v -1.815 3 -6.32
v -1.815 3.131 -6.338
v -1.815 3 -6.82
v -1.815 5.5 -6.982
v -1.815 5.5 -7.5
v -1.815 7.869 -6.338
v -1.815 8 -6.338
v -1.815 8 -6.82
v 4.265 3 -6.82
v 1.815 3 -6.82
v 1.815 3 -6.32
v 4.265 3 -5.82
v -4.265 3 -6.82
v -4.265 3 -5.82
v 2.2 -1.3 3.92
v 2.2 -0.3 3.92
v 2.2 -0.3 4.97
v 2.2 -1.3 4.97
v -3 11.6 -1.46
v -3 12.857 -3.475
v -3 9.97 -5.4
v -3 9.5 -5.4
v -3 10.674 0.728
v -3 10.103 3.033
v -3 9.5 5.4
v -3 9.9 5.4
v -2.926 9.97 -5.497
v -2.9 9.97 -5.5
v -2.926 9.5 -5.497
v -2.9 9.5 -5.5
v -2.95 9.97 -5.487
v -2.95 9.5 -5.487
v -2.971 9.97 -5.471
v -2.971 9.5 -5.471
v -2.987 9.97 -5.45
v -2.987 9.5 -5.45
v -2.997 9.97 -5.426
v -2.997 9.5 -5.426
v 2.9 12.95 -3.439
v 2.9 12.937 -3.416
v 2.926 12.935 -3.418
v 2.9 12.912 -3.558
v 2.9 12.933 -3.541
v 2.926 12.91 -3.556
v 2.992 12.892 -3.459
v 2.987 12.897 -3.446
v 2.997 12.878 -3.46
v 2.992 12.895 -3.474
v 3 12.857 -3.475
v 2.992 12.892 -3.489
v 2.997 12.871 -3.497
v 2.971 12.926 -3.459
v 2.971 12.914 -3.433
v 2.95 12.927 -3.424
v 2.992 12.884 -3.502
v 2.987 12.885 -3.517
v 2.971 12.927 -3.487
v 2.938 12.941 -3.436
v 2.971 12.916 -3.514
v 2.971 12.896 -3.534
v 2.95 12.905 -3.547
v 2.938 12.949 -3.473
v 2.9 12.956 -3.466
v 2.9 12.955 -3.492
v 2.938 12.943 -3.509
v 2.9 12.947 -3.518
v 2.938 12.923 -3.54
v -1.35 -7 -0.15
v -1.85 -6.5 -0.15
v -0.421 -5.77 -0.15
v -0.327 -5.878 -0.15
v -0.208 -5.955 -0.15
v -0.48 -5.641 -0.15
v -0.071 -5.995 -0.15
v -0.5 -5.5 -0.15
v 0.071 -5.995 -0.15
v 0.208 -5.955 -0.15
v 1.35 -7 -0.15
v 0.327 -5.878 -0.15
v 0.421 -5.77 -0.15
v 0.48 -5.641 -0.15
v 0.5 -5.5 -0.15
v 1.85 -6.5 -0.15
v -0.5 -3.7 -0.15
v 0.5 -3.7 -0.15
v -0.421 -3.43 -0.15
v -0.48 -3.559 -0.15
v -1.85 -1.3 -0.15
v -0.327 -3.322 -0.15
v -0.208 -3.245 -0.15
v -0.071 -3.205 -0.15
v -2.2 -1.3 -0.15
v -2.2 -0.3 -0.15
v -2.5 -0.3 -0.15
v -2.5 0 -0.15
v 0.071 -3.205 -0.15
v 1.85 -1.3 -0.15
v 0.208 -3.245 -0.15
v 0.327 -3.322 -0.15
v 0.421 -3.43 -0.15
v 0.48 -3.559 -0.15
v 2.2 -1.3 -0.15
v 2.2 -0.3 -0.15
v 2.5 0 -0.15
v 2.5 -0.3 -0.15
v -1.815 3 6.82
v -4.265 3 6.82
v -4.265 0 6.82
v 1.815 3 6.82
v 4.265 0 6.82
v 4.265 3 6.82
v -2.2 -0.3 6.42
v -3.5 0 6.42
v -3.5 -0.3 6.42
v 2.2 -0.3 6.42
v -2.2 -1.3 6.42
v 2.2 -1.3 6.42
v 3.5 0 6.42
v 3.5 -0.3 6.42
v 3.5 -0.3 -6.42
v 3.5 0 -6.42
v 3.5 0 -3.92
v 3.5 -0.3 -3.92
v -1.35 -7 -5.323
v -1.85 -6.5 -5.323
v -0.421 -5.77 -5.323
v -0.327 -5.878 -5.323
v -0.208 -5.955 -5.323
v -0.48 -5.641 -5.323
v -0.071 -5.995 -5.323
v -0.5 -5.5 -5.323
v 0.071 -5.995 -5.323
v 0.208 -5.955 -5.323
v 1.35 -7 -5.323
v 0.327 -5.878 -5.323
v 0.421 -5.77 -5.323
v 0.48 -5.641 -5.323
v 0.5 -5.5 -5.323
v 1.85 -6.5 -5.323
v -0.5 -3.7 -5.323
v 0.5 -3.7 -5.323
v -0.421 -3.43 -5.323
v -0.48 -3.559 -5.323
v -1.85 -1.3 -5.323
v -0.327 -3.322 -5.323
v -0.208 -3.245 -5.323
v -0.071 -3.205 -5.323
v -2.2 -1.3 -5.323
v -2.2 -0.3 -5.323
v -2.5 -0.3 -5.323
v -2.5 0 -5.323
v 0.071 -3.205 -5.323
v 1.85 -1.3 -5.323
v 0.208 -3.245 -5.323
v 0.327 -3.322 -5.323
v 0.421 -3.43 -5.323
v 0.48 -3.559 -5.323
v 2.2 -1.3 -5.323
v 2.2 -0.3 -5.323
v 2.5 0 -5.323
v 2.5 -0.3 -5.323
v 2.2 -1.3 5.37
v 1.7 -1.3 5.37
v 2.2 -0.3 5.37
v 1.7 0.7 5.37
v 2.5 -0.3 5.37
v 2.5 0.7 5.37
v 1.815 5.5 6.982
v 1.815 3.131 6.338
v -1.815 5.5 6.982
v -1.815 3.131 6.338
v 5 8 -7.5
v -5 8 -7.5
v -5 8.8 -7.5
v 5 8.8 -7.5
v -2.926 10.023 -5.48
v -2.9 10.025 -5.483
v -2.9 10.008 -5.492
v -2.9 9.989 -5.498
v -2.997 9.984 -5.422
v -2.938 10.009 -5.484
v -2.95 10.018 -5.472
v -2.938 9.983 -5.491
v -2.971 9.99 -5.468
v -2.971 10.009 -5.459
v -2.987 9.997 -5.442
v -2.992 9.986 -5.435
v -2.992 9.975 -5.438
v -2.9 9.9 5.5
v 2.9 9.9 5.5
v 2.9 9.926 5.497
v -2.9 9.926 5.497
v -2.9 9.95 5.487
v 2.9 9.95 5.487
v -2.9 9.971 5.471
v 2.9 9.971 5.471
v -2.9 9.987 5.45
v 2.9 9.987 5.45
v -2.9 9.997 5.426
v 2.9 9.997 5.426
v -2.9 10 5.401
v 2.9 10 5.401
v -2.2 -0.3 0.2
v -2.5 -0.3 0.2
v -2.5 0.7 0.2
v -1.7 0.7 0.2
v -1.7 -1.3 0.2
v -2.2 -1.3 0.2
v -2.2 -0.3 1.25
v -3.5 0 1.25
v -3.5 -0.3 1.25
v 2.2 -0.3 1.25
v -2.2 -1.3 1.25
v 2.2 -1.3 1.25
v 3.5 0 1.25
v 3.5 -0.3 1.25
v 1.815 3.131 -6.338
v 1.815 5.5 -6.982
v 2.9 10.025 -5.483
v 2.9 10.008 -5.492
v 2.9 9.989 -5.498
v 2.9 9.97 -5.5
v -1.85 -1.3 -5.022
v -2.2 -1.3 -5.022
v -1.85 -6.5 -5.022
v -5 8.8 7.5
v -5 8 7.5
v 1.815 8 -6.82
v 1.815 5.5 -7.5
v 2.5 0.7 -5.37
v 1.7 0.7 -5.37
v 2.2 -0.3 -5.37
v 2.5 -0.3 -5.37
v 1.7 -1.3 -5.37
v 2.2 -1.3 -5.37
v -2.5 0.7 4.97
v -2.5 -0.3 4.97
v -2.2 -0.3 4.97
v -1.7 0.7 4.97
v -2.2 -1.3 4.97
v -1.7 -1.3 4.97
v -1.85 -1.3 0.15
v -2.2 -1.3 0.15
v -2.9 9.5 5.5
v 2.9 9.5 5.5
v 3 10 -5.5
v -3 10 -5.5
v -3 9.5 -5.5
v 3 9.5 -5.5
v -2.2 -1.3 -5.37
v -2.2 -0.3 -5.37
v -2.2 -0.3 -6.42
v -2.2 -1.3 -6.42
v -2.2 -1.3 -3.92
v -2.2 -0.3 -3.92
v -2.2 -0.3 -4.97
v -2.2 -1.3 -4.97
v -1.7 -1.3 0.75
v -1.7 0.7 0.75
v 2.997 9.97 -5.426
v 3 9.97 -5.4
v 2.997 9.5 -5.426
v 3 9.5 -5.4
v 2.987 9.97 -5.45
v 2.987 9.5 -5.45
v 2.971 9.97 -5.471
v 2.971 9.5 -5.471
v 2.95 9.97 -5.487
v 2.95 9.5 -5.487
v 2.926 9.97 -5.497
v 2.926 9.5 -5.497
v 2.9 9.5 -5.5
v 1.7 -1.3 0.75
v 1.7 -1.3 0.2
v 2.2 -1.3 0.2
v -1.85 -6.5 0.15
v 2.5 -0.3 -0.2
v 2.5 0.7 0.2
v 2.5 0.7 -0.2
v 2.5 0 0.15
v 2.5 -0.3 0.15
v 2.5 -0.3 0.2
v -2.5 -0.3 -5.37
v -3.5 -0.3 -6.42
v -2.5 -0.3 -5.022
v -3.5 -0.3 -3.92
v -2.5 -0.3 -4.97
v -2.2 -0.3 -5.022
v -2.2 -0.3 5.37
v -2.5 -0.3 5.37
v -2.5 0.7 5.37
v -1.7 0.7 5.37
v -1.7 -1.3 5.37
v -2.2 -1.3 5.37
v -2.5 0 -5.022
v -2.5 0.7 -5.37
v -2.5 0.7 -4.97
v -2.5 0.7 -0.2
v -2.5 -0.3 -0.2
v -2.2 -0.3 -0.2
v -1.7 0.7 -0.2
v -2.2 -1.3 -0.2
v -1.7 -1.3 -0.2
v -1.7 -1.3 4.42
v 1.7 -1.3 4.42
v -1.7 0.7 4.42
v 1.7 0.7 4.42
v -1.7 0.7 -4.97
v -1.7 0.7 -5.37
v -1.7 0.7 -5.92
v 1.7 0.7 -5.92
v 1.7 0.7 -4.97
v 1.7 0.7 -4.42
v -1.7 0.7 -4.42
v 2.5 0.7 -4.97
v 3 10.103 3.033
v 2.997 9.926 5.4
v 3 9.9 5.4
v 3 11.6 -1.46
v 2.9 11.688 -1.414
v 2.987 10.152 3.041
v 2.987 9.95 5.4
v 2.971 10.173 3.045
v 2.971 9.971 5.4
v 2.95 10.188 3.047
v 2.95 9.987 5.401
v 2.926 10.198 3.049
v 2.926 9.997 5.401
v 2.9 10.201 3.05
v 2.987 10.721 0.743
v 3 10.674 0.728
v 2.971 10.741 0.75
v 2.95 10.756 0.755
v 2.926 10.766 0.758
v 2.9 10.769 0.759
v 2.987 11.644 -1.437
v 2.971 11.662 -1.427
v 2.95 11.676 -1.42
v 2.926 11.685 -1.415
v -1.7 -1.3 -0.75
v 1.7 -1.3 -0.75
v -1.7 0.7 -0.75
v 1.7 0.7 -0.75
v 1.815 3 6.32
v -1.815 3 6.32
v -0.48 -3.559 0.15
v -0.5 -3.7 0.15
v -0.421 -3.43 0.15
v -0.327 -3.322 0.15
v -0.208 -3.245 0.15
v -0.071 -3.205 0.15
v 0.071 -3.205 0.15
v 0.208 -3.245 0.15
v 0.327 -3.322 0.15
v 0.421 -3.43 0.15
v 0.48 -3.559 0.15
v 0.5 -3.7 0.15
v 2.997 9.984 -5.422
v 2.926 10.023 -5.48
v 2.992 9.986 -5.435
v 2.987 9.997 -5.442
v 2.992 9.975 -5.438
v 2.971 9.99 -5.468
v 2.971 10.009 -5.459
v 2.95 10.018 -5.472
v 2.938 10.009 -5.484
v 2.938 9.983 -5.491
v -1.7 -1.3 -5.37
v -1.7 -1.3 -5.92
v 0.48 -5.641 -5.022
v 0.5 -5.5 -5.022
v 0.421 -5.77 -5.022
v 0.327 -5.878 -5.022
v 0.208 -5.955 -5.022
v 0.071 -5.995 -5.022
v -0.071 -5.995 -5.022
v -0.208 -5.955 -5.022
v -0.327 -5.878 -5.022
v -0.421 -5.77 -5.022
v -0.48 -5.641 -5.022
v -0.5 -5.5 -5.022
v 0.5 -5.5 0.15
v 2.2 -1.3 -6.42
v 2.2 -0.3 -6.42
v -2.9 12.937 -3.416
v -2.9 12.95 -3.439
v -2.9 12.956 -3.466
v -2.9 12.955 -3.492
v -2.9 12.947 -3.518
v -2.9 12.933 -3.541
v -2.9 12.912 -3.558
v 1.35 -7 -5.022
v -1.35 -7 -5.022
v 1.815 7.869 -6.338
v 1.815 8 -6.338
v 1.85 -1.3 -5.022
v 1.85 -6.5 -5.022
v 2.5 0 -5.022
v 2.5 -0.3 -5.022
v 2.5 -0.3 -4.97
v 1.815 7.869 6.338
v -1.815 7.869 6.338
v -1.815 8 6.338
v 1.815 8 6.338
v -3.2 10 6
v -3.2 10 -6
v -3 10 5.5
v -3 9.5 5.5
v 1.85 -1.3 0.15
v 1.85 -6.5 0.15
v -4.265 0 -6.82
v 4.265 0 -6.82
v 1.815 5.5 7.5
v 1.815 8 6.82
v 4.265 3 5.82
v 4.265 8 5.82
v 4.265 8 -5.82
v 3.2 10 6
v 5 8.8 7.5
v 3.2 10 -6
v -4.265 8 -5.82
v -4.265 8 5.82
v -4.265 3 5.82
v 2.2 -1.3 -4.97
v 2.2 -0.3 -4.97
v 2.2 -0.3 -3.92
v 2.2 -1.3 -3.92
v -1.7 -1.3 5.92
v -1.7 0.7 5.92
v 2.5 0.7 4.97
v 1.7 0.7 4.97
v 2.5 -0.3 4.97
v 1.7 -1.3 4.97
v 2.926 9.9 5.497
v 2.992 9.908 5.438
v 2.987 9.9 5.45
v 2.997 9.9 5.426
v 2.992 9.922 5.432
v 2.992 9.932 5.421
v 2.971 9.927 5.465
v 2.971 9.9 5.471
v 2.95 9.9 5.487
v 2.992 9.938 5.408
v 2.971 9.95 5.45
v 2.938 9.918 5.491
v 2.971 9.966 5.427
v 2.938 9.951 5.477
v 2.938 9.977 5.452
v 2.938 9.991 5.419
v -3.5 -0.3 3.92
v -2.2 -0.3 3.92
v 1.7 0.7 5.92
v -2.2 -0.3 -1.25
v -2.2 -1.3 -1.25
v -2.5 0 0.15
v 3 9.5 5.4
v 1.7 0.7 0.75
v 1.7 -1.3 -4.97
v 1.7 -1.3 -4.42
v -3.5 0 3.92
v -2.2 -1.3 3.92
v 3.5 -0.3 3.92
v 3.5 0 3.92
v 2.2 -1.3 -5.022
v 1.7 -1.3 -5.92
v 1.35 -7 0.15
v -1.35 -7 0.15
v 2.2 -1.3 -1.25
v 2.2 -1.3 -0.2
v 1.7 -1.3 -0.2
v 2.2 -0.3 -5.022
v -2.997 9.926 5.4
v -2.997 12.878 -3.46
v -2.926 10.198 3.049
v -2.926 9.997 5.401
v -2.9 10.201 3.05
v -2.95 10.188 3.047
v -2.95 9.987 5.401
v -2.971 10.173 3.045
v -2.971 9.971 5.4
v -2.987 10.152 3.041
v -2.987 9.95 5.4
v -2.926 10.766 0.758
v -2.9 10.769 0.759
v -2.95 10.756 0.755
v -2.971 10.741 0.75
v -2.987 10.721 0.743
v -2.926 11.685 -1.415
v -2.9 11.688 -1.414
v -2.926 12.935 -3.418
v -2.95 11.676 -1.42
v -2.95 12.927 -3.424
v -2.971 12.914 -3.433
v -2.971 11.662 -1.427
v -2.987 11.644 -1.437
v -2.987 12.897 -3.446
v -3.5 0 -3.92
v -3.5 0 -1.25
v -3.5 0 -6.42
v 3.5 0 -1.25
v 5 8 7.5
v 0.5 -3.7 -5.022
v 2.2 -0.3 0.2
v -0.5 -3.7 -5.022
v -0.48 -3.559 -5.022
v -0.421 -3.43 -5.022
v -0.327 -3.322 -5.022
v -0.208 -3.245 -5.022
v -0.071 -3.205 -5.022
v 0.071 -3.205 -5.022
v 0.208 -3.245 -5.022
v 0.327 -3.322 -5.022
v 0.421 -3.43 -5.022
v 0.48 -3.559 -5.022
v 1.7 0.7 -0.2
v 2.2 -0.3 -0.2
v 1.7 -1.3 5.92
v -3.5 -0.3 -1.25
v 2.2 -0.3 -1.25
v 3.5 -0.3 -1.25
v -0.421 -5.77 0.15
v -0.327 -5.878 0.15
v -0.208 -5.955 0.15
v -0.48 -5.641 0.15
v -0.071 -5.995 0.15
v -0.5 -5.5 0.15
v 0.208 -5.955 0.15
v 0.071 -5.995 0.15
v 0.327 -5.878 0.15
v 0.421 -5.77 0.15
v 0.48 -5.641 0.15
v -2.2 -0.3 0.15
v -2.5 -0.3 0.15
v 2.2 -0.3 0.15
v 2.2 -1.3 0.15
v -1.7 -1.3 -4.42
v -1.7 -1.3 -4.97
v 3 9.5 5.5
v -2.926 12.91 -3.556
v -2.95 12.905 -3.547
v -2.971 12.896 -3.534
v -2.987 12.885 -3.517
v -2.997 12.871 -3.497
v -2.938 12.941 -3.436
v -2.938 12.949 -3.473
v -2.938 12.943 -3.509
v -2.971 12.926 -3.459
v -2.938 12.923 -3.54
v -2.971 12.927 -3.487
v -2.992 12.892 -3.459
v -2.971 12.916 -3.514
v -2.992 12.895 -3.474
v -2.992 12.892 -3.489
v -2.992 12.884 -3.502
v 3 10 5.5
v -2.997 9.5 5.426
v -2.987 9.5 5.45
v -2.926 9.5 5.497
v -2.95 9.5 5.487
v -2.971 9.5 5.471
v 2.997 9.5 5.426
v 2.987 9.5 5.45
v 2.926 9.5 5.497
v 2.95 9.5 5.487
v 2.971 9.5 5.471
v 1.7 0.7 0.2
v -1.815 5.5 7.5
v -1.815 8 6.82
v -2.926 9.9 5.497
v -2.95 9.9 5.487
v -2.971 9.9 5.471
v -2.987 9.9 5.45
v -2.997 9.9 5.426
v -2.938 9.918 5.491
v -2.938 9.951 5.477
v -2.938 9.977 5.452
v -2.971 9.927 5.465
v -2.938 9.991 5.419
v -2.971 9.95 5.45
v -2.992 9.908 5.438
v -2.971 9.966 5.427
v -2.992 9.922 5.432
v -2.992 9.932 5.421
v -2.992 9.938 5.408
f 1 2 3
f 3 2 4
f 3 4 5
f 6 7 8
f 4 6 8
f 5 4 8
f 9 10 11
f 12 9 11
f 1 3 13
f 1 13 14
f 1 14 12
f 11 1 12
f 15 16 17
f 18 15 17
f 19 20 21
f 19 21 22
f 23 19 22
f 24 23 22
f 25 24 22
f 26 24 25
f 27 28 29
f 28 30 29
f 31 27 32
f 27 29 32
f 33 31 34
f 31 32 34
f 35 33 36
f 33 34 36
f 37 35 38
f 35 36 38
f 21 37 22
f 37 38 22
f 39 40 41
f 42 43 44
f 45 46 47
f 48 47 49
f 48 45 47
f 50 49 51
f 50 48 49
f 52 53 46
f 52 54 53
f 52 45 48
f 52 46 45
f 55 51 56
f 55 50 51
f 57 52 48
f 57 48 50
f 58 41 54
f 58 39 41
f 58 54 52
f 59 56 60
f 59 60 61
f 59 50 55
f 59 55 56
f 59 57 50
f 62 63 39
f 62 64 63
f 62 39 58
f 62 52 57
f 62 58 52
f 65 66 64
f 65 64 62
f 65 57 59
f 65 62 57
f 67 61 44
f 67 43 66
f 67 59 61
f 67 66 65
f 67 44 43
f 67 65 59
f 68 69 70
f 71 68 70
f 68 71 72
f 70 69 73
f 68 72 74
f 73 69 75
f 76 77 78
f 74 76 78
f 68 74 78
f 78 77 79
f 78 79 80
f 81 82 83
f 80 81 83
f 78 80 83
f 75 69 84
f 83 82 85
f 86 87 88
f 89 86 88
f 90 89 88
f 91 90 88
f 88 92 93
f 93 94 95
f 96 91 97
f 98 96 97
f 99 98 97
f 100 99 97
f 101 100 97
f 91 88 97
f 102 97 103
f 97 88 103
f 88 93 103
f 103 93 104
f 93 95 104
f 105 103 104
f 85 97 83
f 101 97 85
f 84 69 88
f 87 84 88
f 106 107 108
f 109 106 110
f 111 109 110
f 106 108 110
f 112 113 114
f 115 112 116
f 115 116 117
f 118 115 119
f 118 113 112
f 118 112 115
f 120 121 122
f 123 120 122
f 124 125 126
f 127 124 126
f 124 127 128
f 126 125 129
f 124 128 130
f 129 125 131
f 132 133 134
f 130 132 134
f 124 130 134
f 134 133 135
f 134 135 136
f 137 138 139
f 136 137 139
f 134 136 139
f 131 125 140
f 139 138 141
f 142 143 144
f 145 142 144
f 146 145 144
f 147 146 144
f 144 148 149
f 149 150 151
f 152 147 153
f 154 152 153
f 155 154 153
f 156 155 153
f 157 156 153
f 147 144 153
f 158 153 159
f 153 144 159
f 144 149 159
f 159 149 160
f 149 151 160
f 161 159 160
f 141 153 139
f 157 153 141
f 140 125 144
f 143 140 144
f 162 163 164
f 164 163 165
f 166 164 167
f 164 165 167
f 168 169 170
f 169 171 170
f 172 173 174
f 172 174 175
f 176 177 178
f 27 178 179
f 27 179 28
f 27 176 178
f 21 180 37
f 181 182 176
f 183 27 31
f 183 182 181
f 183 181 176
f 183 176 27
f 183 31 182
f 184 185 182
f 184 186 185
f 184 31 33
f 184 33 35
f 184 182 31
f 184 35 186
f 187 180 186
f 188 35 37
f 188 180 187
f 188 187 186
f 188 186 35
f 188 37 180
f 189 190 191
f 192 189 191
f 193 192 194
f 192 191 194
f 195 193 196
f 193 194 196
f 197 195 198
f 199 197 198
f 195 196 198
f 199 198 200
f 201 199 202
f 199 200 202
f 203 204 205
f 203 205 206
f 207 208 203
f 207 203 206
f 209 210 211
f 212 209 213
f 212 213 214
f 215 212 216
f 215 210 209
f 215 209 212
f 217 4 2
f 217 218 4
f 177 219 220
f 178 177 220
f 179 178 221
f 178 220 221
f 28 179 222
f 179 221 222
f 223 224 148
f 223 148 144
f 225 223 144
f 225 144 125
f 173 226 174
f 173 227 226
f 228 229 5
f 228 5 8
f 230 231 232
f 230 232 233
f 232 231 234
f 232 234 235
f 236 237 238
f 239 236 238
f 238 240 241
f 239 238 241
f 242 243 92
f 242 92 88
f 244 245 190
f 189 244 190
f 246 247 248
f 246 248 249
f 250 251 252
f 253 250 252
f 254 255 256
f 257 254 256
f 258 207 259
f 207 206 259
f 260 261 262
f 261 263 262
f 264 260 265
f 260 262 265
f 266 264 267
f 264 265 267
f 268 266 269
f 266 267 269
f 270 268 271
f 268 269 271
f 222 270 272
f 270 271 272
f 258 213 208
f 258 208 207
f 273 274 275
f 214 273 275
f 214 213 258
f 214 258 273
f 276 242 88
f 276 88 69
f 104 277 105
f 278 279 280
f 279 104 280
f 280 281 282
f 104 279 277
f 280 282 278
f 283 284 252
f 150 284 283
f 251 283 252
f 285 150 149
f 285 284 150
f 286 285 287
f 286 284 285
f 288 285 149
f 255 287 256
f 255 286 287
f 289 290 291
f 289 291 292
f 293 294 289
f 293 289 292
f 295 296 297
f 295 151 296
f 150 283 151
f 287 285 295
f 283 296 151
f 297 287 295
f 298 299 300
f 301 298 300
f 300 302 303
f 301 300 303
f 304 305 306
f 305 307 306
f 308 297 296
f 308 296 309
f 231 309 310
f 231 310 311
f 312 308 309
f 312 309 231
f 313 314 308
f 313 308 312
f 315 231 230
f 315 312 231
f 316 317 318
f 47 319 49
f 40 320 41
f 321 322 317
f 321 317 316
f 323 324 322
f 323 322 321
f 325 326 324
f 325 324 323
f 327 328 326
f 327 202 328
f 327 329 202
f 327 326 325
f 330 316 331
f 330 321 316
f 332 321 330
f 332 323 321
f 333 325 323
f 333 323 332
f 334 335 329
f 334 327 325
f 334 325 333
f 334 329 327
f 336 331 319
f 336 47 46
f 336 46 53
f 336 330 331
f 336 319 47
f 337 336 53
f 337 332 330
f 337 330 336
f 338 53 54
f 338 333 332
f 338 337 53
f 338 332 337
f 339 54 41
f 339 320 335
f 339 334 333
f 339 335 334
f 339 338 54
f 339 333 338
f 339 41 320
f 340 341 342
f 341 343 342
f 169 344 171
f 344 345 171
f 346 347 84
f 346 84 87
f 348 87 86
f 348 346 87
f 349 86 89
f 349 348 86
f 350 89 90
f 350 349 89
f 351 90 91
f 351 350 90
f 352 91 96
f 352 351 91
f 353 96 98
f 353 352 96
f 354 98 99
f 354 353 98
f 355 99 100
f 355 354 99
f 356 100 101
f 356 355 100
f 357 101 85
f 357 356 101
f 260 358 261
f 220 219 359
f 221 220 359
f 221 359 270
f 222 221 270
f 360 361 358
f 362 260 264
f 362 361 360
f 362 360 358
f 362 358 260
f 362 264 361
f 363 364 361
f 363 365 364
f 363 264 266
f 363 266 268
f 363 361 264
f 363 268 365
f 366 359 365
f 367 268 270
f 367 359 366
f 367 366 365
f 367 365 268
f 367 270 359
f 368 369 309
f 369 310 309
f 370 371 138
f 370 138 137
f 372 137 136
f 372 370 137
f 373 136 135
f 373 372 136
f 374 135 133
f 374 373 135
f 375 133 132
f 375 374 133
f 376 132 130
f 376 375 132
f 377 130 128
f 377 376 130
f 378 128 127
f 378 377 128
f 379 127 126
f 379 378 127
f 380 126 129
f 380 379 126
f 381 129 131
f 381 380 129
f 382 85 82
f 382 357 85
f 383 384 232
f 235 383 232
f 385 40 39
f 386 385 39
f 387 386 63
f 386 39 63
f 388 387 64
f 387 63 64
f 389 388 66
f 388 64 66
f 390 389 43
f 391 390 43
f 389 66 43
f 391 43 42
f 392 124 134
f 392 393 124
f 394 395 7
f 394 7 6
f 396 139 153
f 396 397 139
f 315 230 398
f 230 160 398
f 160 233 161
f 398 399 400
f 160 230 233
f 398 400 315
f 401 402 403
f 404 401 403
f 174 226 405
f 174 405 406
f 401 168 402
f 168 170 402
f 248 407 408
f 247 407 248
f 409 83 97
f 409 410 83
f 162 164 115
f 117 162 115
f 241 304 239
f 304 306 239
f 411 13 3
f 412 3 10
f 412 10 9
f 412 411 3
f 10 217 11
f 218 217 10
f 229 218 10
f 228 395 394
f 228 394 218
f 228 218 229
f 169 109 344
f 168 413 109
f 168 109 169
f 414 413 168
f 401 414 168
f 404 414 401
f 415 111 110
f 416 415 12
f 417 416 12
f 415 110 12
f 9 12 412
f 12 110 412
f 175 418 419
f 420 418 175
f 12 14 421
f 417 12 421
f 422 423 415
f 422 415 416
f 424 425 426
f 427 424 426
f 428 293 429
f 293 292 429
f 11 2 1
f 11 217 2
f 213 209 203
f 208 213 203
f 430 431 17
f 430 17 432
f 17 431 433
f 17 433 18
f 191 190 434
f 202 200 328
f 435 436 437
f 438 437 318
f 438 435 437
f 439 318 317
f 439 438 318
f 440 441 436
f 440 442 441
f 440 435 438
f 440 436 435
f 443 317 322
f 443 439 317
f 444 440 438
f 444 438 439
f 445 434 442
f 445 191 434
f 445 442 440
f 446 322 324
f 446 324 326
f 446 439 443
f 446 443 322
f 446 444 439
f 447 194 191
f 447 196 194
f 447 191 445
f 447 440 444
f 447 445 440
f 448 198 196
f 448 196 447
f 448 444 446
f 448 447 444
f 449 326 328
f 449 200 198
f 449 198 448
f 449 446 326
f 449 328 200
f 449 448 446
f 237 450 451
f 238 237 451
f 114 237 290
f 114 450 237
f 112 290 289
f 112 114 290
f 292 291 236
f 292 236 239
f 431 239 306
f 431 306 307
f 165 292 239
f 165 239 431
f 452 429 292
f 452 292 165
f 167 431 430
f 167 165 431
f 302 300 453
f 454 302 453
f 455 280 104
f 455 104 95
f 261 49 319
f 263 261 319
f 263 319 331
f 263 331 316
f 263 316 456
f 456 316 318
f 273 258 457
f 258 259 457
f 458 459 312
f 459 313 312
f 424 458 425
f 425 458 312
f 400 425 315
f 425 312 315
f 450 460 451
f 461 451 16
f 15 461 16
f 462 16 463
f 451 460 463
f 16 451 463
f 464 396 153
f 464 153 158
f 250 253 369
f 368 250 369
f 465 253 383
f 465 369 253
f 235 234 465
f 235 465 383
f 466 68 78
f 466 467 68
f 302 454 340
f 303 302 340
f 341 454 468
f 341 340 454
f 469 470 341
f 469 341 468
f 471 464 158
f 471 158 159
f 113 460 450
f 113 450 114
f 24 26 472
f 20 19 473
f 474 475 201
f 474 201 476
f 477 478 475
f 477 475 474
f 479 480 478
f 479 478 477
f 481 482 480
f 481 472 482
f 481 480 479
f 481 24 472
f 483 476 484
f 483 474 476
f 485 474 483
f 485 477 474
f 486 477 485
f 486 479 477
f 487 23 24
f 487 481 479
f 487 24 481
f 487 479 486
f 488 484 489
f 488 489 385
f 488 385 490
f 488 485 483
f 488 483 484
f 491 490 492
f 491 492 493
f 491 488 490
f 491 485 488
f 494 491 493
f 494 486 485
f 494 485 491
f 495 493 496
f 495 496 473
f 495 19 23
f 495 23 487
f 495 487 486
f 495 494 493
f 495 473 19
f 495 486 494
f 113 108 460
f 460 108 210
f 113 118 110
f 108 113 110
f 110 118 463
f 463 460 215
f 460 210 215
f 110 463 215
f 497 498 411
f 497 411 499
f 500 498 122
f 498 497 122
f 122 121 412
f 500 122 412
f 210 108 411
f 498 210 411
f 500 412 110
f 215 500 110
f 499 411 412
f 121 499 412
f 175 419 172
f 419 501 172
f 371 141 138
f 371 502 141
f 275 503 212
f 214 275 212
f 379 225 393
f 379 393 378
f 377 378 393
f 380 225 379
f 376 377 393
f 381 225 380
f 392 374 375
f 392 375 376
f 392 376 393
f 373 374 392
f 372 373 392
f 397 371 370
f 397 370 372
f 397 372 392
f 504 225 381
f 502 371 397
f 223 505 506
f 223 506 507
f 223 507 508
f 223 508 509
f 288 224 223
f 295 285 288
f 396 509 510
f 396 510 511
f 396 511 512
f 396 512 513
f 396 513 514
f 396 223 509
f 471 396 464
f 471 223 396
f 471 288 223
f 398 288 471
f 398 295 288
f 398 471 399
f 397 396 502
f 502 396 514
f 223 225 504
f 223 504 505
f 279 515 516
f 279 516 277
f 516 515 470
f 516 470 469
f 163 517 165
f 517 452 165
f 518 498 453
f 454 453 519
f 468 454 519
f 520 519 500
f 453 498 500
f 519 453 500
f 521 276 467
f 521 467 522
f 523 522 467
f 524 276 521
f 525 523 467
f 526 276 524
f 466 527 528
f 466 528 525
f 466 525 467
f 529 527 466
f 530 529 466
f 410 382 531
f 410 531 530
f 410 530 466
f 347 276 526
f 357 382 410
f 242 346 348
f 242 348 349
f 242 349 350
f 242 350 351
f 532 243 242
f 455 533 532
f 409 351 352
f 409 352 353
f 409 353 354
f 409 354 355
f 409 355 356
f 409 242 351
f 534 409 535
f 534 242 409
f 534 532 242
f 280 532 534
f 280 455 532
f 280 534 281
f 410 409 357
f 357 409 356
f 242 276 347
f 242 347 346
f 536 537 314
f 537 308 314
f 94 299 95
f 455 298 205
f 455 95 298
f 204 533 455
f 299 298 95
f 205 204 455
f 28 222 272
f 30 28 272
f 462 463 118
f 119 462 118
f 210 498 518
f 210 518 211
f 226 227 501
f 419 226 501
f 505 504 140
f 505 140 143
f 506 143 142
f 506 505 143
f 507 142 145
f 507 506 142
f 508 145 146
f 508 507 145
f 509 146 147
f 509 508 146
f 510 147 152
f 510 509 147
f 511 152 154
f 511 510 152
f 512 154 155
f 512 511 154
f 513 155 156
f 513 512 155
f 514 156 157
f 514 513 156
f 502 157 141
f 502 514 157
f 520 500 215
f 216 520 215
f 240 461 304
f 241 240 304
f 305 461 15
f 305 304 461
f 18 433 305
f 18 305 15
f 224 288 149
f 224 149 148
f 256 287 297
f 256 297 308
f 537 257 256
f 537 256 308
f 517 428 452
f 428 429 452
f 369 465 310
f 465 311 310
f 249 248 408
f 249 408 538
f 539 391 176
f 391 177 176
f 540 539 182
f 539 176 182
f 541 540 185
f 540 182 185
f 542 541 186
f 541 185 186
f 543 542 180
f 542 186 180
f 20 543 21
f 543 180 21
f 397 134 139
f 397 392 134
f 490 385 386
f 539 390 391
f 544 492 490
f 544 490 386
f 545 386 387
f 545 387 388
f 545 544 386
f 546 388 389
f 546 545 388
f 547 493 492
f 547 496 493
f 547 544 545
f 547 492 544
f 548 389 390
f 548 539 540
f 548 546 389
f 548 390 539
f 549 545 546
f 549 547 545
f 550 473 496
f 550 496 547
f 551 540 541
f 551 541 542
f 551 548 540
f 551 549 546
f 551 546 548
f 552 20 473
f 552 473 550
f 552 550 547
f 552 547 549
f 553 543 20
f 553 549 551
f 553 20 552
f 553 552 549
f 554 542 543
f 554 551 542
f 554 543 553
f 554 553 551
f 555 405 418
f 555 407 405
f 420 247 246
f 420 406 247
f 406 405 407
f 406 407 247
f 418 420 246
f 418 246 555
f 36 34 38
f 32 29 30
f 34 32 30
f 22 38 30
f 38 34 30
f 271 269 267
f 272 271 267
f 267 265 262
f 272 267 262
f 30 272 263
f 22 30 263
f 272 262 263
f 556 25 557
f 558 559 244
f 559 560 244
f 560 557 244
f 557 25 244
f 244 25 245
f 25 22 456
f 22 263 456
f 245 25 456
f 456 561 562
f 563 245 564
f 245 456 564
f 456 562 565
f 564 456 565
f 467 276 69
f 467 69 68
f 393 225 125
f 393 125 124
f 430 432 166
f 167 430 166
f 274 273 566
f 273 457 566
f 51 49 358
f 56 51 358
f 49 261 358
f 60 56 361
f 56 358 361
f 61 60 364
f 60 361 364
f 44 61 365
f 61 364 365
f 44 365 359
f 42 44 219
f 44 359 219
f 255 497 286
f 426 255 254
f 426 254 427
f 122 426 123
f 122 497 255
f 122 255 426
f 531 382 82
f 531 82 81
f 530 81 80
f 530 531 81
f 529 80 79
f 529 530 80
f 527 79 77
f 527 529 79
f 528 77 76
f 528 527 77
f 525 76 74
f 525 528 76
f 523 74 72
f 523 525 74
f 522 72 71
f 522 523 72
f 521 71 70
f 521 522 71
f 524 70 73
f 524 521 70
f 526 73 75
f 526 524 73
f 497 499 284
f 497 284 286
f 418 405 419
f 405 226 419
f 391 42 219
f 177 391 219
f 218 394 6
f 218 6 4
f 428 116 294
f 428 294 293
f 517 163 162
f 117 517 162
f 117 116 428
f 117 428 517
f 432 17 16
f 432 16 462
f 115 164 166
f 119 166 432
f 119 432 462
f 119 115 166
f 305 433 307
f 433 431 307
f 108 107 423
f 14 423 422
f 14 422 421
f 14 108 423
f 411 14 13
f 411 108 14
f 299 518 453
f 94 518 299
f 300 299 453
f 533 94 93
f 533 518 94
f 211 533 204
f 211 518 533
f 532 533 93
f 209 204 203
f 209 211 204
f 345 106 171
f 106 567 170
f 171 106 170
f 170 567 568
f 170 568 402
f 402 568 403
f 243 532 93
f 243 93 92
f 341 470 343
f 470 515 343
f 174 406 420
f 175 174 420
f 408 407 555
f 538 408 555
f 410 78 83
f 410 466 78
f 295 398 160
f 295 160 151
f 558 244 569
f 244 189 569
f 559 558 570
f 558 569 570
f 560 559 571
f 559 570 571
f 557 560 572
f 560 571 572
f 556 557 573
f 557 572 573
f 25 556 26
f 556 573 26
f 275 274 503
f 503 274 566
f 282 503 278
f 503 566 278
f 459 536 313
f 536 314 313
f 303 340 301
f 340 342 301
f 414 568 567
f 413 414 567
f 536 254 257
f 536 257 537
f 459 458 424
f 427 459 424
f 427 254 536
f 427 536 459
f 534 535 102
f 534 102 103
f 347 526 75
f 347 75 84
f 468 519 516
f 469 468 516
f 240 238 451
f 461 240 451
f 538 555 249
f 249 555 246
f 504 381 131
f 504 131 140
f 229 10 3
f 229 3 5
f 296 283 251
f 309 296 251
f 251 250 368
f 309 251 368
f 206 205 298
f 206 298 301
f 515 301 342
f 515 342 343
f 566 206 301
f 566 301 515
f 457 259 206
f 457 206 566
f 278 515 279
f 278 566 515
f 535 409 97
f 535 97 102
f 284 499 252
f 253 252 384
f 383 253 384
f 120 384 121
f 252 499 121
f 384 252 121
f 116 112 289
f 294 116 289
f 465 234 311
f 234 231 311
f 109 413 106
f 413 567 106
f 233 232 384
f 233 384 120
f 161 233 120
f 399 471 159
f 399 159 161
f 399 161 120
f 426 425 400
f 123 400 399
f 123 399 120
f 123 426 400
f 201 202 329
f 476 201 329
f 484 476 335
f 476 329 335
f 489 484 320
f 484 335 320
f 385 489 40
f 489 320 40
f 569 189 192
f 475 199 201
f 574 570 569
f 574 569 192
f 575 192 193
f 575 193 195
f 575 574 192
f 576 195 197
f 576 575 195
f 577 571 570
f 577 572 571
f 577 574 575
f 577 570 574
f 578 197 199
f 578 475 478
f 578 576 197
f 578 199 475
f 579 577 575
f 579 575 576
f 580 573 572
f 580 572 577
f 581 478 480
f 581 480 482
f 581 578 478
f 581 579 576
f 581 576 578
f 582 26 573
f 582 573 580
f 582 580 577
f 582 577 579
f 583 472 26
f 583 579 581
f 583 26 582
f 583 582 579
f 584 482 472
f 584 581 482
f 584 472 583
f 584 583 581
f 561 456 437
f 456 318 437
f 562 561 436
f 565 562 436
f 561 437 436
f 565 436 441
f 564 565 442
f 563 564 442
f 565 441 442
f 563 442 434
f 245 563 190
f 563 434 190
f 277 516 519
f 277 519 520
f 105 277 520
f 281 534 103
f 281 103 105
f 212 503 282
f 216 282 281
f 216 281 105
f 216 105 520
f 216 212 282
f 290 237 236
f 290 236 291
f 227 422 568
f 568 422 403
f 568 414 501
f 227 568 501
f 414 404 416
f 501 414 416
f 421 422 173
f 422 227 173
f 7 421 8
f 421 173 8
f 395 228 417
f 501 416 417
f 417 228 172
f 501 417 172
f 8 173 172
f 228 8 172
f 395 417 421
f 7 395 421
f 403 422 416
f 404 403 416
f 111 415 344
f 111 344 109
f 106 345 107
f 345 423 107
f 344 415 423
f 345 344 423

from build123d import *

# Parameters (mm, degrees)
SKETCH1_W           = 8.53
SKETCH1_H           = 13.64
BOSS_EXTRUDE1_DEPTH = 10
SKETCH2_W           = 1
SKETCH2_H           = 5
CUT_EXTRUDE1_DEPTH  = 9.53
SKETCH3_W           = 6
SKETCH3_H           = 11
CUT_EXTRUDE2_DEPTH  = 0.5
BOSS_EXTRUDE2_START = -2
SKETCH4_W           = 10
SKETCH4_H           = 15
SKETCH4_W_2         = 8.53
SKETCH4_H_2         = 13.64
SKETCH4_W_3         = 6
SKETCH4_H_3         = 11
BOSS_EXTRUDE2_DEPTH = 2
CHAMFER1_SIZE       = 1.5
CHAMFER1_SIZE2      = 1.2
CHAMFER2_SIZE       = 1.2
CHAMFER2_SIZE2      = 1.5
CHAMFER3_SIZE       = 1.8
CHAMFER3_SIZE2      = 1.2
CHAMFER4_SIZE       = 1.2
CHAMFER4_SIZE2      = 1.8
BOSS_EXTRUDE3_DEPTH = 1.815
SKETCH7_W           = 7
SKETCH7_H           = 2.5
BOSS_EXTRUDE4_DEPTH = 0.3
BOSS_EXTRUDE5_DEPTH = 1
SKETCH8_5_W         = 5
SKETCH8_5_H         = 0.4
SKETCH8_5_W_2       = 3.4
SKETCH8_5_H_2       = 1.5
CUT_EXTRUDE4_DEPTH  = 1
BOSS_EXTRUDE6_DEPTH = 0.15
LPATTERN1_COUNT     = 2
LPATTERN1_PITCH     = 5.1725
BOSS_EXTRUDE7_DEPTH = 3
FILLET1_R           = 0.1


with BuildPart() as part:
    # Sketch1 → Boss-Extrude1 (new body)
    with BuildSketch(Plane(origin=(0, 0, 0), x_dir=(1, 0, 0), z_dir=(0, 1, 0))):
        Rectangle(SKETCH1_W, SKETCH1_H)
    extrude(amount=BOSS_EXTRUDE1_DEPTH)

    # Sketch2 → Cut-Extrude1 (cut, through all)
    with BuildSketch(Plane.ZY.offset(4.265)):
        with Locations((-6.32, 5.5)):
            Rectangle(SKETCH2_W, SKETCH2_H)
        with Locations((6.32, 5.5)):
            Rectangle(SKETCH2_W, SKETCH2_H)
    extrude(amount=-CUT_EXTRUDE1_DEPTH, mode=Mode.SUBTRACT)

    # Sketch3 → Cut-Extrude2 (cut)
    with BuildSketch(Plane(origin=(0, 10, 0), x_dir=(1, 0, 0), z_dir=(0, 1, 0))):
        Rectangle(SKETCH3_W, SKETCH3_H)
    extrude(amount=-CUT_EXTRUDE2_DEPTH, mode=Mode.SUBTRACT)

    # Sketch4 → Boss-Extrude2 (add)
    with BuildSketch(Plane(origin=(0, 10, 0), x_dir=(1, 0, 0), z_dir=(0, 1, 0)).offset(BOSS_EXTRUDE2_START)):
        Rectangle(SKETCH4_W, SKETCH4_H)
        Rectangle(SKETCH4_W_2, SKETCH4_H_2, mode=Mode.SUBTRACT)
        Rectangle(SKETCH4_W_2, SKETCH4_H_2)
        Rectangle(SKETCH4_W_3, SKETCH4_H_3, mode=Mode.SUBTRACT)
    extrude(amount=BOSS_EXTRUDE2_DEPTH)

    # Chamfer1
    chamfer1_edges = [part.edges().sort_by_distance(p)[0] for p in [
        (0, 10, 7.5),
    ]]
    chamfer1_side = [part.faces().sort_by_distance(p)[0] for p in [
        (-4.819722436, 10, 0),
    ]]
    chamfer(chamfer1_edges, length=CHAMFER1_SIZE, length2=CHAMFER1_SIZE2, reference=chamfer1_side[0])

    # Chamfer2
    chamfer2_edges = [part.edges().sort_by_distance(p)[0] for p in [
        (0, 10, -7.5),
    ]]
    chamfer2_side = [part.faces().sort_by_distance(p)[0] for p in [
        (0, 9, -7.5),
    ]]
    chamfer(chamfer2_edges, length=CHAMFER2_SIZE, length2=CHAMFER2_SIZE2, reference=chamfer2_side[0])

    # Chamfer3
    chamfer3_edges = [part.edges().sort_by_distance(p)[0] for p in [
        (-5, 10, 0),
    ]]
    chamfer3_side = [part.faces().sort_by_distance(p)[0] for p in [
        (-4.843795006, 10, 0),
    ]]
    chamfer(chamfer3_edges, length=CHAMFER3_SIZE, length2=CHAMFER3_SIZE2, reference=chamfer3_side[0])

    # Chamfer4
    chamfer4_edges = [part.edges().sort_by_distance(p)[0] for p in [
        (5, 10, 0),
    ]]
    chamfer4_side = [part.faces().sort_by_distance(p)[0] for p in [
        (5, 8.961702128, 0),
    ]]
    chamfer(chamfer4_edges, length=CHAMFER4_SIZE, length2=CHAMFER4_SIZE2, reference=chamfer4_side[0])

    # Sketch6 → Boss-Extrude3 (add, symmetric)
    with BuildSketch(Plane(origin=(0, 0, 0), x_dir=(0, 0, -1), z_dir=(1, 0, 0))):
        Polygon((-6.82, 8), (-7.5, 5.5), (-6.82, 3), (-6.32, 3), (-6.337529128, 3.131232077), (-6.981834003, 5.5), (-6.337529128, 7.868767923), (-6.337529128, 8), align=None)
        Polygon((6.32, 3), (6.82, 3), (7.5, 5.5), (6.82, 8), (6.337529128, 8), (6.337529128, 7.868767923), (6.981834003, 5.5), (6.337529128, 3.131232077), align=None)
    extrude(amount=BOSS_EXTRUDE3_DEPTH, both=True)

    # Sketch7 → Boss-Extrude4 (add)
    with BuildSketch(Plane.XZ):
        Rectangle(SKETCH7_W, SKETCH7_H)
        with Locations((0, -5.17)):
            Rectangle(SKETCH7_W, SKETCH7_H)
        with Locations((0, 5.17)):
            Rectangle(SKETCH7_W, SKETCH7_H)
    extrude(amount=BOSS_EXTRUDE4_DEPTH)

    # Sketch8 → Boss-Extrude5 (add)
    with BuildSketch(Plane.XZ.offset(0.3)):
        Polygon((1.7, 5.37), (2.2, 5.37), (2.2, 6.42), (-2.2, 6.42), (-2.2, 5.37), (-1.7, 5.37), (-1.7, 5.92), (1.7, 5.92), align=None)
        Polygon((-2.2, 3.92), (2.2, 3.92), (2.2, 4.97), (1.7, 4.97), (1.7, 4.42), (-1.7, 4.42), (-1.7, 4.97), (-2.2, 4.97), align=None)
        Polygon((1.7, 0.2), (2.2, 0.2), (2.2, 1.25), (-2.2, 1.25), (-2.2, 0.2), (-1.7, 0.2), (-1.7, 0.75), (1.7, 0.75), align=None)
        Polygon((-2.2, -1.25), (2.2, -1.25), (2.2, -0.2), (1.7, -0.2), (1.7, -0.75), (-1.7, -0.75), (-1.7, -0.2), (-2.2, -0.2), align=None)
        Polygon((1.7, -4.97), (2.2, -4.97), (2.2, -3.92), (-2.2, -3.92), (-2.2, -4.97), (-1.7, -4.97), (-1.7, -4.42), (1.7, -4.42), align=None)
        Polygon((-2.2, -6.42), (2.2, -6.42), (2.2, -5.37), (1.7, -5.37), (1.7, -5.92), (-1.7, -5.92), (-1.7, -5.37), (-2.2, -5.37), align=None)
    extrude(amount=BOSS_EXTRUDE5_DEPTH)

    # Sketch8<5> → Cut-Extrude4 (cut)
    with BuildSketch(Plane.XZ.offset(0.3)):
        Rectangle(SKETCH8_5_W, SKETCH8_5_H)
        with Locations((0, -5.17)):
            Rectangle(SKETCH8_5_W, SKETCH8_5_H)
        with Locations((0, 5.17)):
            Rectangle(SKETCH8_5_W, SKETCH8_5_H)
        with Locations((0, 5.17)):
            Rectangle(SKETCH8_5_W_2, SKETCH8_5_H_2)
        Rectangle(SKETCH8_5_W_2, SKETCH8_5_H_2)
        with Locations((0, -5.17)):
            Rectangle(SKETCH8_5_W_2, SKETCH8_5_H_2)
    extrude(amount=-CUT_EXTRUDE4_DEPTH, mode=Mode.SUBTRACT)

    # Sketch10 → Boss-Extrude6 (add, symmetric)
    with BuildSketch(Plane.XY):
        Polygon((1.85, -1.65), (1.85, -1.3), (-1.85, -1.3), (-1.85, -1.65), (-1.85, -6.5), (-1.35, -7), (1.35, -7), (1.85, -6.5), align=None)
        with BuildLine():
            ThreePointArc((0.5, -5.5), (0, -6), (-0.5, -5.5))
            Line((-0.5, -5.5), (-0.5, -3.7))
            ThreePointArc((-0.5, -3.7), (0, -3.2), (0.5, -3.7))
            Line((0.5, -3.7), (0.5, -5.5))
        make_face(mode=Mode.SUBTRACT)
        Polygon((2.5, 0), (1.85, 0), (-1.85, 0), (-2.5, 0), (-2.5, -0.3), (-2.2, -0.3), (-2.2, -1.3), (-1.85, -1.3), (1.85, -1.3), (2.2, -1.3), (2.2, -0.3), (2.5, -0.3), align=None)
    boss_extrude6 = extrude(amount=BOSS_EXTRUDE6_DEPTH, both=True)

    # LPattern1: Boss-Extrude6 ×2
    with Locations(*[(0, 0, -i * LPATTERN1_PITCH) for i in range(1, LPATTERN1_COUNT)]):
        add(boss_extrude6)


with BuildPart() as body_2:
    # Sketch11 → Boss-Extrude7 (new body, symmetric)
    with BuildSketch(Plane(origin=(0, 0, 0), x_dir=(0, 0, -1), z_dir=(1, 0, 0))):
        with BuildLine():
            Line((5.5, 9.5), (-5.5, 9.5))
            Line((-5.5, 9.5), (-5.5, 9.900331129))
            ThreePointArc((-5.5, 9.900331129), (-5.470944433, 9.970807277), (-5.400662252, 10.000328937))
            ThreePointArc((-5.400662252, 10.000328937), (-0.759264413, 10.768857175), (3.415788118, 12.937300375))
            ThreePointArc((3.415788118, 12.937300375), (3.492454919, 12.955387143), (3.558431735, 12.912352398))
            Line((3.558431735, 12.912352398), (5.483205029, 10.025192456))
            ThreePointArc((5.483205029, 10.025192456), (5.495709203, 9.998700851), (5.5, 9.969722436))
            Line((5.5, 9.969722436), (5.5, 9.5))
        make_face()
    extrude(amount=BOSS_EXTRUDE7_DEPTH, both=True)

    # Fillet1
    fillet1_edges = [body_2.edges().sort_by_distance(p)[0] for p in [
        (-3, 12.955387143, -3.492454919),
        (-3, 11.468772427, -4.520818382),
        (-3, 9.998700851, -5.495709203),
        (-3, 9.734861218, -5.5),
        (3, 11.468772427, -4.520818382),
        (3, 12.955387143, -3.492454919),
        (3, 10.768857175, 0.759264413),
        (3, 9.970807277, 5.470944433),
        (3, 9.700165565, 5.5),
        (3, 9.734861218, -5.5),
        (3, 9.998700851, -5.495709203),
        (-3, 9.700165565, 5.5),
        (-3, 9.970807277, 5.470944433),
        (-3, 10.768857175, 0.759264413),
    ]]
    fillet(fillet1_edges, radius=FILLET1_R)


solid = Compound([part.part, body_2.part])
